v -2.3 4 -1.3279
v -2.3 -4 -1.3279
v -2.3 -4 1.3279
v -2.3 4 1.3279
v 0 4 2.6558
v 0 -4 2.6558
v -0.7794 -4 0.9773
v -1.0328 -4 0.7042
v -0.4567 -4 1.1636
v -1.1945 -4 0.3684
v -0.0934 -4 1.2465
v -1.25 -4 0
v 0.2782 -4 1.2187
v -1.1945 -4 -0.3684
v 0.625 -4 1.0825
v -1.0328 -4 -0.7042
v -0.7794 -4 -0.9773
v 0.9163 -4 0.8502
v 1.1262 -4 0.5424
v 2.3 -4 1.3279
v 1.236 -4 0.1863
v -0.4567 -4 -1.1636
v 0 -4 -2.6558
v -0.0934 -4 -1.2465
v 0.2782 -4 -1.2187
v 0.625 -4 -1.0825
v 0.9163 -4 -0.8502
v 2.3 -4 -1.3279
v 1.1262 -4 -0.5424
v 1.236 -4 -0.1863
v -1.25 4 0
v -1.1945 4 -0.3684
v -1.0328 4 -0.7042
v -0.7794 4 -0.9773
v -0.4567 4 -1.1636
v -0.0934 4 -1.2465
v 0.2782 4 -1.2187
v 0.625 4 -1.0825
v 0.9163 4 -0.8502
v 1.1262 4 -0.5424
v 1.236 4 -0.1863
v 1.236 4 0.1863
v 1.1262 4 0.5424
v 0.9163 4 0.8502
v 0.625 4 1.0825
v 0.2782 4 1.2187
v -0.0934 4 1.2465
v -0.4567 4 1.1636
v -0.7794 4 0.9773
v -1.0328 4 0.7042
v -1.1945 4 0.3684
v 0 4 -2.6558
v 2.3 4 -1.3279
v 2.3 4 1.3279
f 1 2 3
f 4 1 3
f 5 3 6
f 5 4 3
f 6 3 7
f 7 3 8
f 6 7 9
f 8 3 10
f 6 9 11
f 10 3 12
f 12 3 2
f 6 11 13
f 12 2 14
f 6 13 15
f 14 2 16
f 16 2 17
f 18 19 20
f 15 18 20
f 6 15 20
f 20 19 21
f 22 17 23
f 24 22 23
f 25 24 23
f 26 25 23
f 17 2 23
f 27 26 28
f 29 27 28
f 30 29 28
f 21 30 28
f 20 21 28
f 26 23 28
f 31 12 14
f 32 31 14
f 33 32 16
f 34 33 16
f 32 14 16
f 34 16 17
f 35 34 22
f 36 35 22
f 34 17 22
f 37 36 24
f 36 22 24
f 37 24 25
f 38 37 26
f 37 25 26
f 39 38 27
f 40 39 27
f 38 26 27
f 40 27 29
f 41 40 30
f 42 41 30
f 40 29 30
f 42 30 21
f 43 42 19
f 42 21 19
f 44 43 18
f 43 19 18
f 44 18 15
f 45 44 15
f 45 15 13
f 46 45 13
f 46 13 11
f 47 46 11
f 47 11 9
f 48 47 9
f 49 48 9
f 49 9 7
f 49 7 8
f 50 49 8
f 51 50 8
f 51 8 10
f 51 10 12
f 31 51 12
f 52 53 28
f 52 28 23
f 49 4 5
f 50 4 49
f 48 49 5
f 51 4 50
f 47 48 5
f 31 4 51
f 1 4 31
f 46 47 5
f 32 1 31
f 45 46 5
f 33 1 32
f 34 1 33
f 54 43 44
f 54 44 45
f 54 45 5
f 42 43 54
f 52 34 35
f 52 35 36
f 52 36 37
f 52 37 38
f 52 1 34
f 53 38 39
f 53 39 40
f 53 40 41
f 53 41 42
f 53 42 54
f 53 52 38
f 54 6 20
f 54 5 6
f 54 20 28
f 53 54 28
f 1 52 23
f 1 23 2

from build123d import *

# Parameters (mm, degrees)
BOSS_EXTRUDE1_DEPTH   = 4
M3_TAPPED_HOLE1_D     = 2.5
M3_TAPPED_HOLE1_DEPTH = 17.5
M3_TAPPED_HOLE1_TIP   = 0.751075774


with BuildPart() as part:
    # Sketch1 → Boss-Extrude1 (new, symmetric)
    with BuildSketch(Plane(origin=(0, 0, 0), x_dir=(1, 0, 0), z_dir=(0, 1, 0))):
        Polygon((2.3, -1.327905619), (2.3, 1.327905619), (0, 2.655811238), (-2.3, 1.327905619), (-2.3, -1.327905619), (0, -2.655811238), align=None)
    extrude(amount=BOSS_EXTRUDE1_DEPTH, both=True)

    # M3 Tapped Hole1
    with Locations(Plane(origin=(0, 4, 0), x_dir=(1, 0, 0), z_dir=(0, 1, 0))):
        with Locations((0, 0)):
            Hole(M3_TAPPED_HOLE1_D / 2, depth=M3_TAPPED_HOLE1_DEPTH)
            with Locations((0, 0, -(M3_TAPPED_HOLE1_DEPTH + M3_TAPPED_HOLE1_TIP / 2))):  # 118° drill point
                Cone(0, M3_TAPPED_HOLE1_D / 2, M3_TAPPED_HOLE1_TIP, mode=Mode.SUBTRACT)


solid = part.part
